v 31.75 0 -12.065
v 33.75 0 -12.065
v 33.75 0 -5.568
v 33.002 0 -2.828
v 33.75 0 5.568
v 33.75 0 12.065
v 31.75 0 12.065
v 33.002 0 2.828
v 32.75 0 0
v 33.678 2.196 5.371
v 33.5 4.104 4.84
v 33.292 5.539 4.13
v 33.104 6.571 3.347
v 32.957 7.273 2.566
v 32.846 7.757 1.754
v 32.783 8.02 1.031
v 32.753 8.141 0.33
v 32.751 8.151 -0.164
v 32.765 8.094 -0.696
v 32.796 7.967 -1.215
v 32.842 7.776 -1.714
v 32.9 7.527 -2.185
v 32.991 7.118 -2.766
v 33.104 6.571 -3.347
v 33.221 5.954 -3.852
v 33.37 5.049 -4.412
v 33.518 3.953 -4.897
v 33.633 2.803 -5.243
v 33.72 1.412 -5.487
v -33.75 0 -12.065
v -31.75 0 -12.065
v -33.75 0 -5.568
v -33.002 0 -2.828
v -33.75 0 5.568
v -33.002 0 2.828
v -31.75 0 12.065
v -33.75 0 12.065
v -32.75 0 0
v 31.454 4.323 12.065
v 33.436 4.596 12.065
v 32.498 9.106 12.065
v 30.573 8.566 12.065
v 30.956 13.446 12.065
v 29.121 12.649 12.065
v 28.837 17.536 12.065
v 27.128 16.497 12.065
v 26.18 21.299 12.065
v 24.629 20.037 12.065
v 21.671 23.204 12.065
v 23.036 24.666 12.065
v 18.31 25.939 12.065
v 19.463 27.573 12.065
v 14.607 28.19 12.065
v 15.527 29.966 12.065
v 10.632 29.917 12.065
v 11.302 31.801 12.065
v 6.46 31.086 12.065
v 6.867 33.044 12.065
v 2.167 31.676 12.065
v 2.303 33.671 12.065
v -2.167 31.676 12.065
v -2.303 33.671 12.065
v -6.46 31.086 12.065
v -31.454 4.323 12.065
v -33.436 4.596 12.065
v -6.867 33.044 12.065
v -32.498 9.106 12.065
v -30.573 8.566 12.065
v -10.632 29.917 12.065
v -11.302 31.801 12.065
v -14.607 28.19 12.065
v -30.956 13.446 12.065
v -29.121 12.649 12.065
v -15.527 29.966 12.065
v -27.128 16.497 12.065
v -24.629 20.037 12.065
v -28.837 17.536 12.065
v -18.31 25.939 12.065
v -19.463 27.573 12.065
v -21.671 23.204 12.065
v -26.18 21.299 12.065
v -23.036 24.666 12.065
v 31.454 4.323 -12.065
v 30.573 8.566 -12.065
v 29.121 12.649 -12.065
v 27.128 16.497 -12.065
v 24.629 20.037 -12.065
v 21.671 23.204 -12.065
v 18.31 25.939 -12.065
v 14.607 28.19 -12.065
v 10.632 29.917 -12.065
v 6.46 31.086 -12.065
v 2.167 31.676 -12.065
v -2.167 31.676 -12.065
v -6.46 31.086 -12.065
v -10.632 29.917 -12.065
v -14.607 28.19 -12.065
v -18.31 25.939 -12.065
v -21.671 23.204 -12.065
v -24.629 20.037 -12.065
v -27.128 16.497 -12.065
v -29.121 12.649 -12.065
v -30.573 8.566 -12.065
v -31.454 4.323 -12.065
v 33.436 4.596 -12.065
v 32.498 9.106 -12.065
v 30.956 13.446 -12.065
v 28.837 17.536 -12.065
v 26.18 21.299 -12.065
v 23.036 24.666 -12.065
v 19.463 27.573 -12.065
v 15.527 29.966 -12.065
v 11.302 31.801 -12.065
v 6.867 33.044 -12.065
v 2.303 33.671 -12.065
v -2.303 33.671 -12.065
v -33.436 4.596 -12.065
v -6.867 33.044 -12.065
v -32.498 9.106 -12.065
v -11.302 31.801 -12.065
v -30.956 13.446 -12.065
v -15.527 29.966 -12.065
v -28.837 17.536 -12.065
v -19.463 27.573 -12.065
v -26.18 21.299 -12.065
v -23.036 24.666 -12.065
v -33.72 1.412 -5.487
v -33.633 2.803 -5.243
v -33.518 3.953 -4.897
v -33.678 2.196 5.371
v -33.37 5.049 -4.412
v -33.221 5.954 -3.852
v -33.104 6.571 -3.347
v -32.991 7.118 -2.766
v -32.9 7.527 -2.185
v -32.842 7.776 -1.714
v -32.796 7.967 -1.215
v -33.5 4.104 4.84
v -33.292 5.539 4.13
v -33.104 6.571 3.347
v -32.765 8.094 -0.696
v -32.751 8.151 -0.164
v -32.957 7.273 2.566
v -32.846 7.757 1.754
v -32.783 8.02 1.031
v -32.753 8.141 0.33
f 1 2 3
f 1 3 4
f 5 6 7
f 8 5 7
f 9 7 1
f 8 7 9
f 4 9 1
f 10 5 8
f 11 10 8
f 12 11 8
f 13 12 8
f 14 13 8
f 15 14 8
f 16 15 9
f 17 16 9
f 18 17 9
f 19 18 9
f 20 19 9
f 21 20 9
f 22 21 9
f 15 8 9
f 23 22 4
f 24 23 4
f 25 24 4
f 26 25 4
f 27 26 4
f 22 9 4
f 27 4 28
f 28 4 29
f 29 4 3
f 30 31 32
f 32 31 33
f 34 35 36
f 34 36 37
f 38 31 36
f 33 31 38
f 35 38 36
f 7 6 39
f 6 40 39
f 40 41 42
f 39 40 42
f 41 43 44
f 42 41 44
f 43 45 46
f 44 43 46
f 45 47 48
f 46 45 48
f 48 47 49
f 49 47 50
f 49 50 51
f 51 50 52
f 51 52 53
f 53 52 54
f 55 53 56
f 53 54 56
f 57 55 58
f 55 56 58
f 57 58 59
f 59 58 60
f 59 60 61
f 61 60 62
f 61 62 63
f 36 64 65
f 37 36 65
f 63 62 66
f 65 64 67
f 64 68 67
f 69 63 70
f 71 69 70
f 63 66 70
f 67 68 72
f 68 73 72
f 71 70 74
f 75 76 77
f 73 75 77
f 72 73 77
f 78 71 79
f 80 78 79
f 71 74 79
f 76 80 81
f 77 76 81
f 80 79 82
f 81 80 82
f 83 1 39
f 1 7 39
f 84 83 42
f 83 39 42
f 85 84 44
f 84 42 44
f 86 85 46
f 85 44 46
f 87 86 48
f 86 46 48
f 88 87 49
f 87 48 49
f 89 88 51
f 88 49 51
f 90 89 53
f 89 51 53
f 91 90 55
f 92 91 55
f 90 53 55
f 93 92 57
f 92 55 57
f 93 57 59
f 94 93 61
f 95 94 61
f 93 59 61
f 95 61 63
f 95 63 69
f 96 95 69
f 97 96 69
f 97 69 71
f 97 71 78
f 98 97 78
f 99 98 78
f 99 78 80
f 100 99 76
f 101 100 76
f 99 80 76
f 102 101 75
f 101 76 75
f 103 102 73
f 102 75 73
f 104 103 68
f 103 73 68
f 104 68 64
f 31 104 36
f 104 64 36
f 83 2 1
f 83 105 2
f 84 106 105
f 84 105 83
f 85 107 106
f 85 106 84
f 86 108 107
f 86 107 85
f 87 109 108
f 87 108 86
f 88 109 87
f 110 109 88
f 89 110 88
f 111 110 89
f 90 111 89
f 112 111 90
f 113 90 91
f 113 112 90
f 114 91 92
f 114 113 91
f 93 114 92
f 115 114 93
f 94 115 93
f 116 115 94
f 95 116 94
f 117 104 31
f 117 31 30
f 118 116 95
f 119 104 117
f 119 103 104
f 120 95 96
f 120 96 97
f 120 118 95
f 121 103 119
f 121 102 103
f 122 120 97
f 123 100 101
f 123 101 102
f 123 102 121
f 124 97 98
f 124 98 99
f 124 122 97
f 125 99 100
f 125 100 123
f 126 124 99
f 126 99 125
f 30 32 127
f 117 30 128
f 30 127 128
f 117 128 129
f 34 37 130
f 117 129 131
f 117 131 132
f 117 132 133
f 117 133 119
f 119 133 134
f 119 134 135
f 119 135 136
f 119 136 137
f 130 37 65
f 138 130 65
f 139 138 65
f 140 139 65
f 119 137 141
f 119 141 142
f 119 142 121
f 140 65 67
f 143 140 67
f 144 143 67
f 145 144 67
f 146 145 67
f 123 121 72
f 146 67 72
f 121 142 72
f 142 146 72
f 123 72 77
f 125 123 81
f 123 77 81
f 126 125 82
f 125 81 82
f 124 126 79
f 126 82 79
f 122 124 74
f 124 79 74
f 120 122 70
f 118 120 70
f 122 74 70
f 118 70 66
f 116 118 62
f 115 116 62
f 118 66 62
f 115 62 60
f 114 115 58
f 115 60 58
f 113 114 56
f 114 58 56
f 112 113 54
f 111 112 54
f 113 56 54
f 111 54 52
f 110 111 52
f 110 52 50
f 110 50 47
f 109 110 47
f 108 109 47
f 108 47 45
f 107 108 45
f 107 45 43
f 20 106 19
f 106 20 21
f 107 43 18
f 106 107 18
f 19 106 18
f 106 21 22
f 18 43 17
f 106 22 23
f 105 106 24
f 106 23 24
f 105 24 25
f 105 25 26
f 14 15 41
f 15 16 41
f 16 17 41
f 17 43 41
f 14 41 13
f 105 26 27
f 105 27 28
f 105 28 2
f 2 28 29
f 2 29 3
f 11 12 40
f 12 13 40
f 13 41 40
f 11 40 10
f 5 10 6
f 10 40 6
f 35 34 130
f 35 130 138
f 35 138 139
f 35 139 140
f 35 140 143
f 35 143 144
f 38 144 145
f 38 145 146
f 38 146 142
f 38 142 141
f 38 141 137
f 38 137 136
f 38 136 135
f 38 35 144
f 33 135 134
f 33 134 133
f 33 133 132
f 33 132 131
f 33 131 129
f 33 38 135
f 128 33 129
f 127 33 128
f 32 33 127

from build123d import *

# Parameters (mm, degrees)
DODANIE_WYCI_GNI_CIE1_DEPTH = 12.065
WYTNIJ_WYCI_GNI_CIE1_DEPTH  = 50.230978306


with BuildPart() as part:
    # Szkic1 → Dodanie-wyciągnięcie1 (new, symmetric)
    with BuildSketch(Plane.XY):
        with BuildLine():
            Line((33.75, 0), (31.75, 0))
            ThreePointArc((31.75, 0), (0, 31.75), (-31.75, 0))
            Line((-31.75, 0), (-33.75, 0))
            ThreePointArc((-33.75, 0), (0, 33.75), (33.75, 0))
        make_face()
    extrude(amount=DODANIE_WYCI_GNI_CIE1_DEPTH, both=True)

    # Szkic2 → Wytnij-wyciągnięcie1 (cut, through all)
    with BuildSketch(Plane(origin=(0, 0, 0), x_dir=(-1, 0, 0), z_dir=(0, -1, 0))):
        with BuildLine():
            Line((-33.75, 5.567764363), (-33.75, 0))
            Line((-33.75, 0), (-33.75, -5.567764363))
            ThreePointArc((-33.75, -5.567764363), (-32.75, 0), (-33.75, 5.567764363))
        make_face()
    wytnij_wyci_gni_cie1 = extrude(amount=-WYTNIJ_WYCI_GNI_CIE1_DEPTH, mode=Mode.SUBTRACT)

    # Lustro1: Wytnij-wyciągnięcie1 across plane
    add(wytnij_wyci_gni_cie1.mirror(Plane(origin=(0, 0, 0), x_dir=(0, 0, 1), z_dir=(1, 0, 0))), mode=Mode.SUBTRACT)


solid = part.part
